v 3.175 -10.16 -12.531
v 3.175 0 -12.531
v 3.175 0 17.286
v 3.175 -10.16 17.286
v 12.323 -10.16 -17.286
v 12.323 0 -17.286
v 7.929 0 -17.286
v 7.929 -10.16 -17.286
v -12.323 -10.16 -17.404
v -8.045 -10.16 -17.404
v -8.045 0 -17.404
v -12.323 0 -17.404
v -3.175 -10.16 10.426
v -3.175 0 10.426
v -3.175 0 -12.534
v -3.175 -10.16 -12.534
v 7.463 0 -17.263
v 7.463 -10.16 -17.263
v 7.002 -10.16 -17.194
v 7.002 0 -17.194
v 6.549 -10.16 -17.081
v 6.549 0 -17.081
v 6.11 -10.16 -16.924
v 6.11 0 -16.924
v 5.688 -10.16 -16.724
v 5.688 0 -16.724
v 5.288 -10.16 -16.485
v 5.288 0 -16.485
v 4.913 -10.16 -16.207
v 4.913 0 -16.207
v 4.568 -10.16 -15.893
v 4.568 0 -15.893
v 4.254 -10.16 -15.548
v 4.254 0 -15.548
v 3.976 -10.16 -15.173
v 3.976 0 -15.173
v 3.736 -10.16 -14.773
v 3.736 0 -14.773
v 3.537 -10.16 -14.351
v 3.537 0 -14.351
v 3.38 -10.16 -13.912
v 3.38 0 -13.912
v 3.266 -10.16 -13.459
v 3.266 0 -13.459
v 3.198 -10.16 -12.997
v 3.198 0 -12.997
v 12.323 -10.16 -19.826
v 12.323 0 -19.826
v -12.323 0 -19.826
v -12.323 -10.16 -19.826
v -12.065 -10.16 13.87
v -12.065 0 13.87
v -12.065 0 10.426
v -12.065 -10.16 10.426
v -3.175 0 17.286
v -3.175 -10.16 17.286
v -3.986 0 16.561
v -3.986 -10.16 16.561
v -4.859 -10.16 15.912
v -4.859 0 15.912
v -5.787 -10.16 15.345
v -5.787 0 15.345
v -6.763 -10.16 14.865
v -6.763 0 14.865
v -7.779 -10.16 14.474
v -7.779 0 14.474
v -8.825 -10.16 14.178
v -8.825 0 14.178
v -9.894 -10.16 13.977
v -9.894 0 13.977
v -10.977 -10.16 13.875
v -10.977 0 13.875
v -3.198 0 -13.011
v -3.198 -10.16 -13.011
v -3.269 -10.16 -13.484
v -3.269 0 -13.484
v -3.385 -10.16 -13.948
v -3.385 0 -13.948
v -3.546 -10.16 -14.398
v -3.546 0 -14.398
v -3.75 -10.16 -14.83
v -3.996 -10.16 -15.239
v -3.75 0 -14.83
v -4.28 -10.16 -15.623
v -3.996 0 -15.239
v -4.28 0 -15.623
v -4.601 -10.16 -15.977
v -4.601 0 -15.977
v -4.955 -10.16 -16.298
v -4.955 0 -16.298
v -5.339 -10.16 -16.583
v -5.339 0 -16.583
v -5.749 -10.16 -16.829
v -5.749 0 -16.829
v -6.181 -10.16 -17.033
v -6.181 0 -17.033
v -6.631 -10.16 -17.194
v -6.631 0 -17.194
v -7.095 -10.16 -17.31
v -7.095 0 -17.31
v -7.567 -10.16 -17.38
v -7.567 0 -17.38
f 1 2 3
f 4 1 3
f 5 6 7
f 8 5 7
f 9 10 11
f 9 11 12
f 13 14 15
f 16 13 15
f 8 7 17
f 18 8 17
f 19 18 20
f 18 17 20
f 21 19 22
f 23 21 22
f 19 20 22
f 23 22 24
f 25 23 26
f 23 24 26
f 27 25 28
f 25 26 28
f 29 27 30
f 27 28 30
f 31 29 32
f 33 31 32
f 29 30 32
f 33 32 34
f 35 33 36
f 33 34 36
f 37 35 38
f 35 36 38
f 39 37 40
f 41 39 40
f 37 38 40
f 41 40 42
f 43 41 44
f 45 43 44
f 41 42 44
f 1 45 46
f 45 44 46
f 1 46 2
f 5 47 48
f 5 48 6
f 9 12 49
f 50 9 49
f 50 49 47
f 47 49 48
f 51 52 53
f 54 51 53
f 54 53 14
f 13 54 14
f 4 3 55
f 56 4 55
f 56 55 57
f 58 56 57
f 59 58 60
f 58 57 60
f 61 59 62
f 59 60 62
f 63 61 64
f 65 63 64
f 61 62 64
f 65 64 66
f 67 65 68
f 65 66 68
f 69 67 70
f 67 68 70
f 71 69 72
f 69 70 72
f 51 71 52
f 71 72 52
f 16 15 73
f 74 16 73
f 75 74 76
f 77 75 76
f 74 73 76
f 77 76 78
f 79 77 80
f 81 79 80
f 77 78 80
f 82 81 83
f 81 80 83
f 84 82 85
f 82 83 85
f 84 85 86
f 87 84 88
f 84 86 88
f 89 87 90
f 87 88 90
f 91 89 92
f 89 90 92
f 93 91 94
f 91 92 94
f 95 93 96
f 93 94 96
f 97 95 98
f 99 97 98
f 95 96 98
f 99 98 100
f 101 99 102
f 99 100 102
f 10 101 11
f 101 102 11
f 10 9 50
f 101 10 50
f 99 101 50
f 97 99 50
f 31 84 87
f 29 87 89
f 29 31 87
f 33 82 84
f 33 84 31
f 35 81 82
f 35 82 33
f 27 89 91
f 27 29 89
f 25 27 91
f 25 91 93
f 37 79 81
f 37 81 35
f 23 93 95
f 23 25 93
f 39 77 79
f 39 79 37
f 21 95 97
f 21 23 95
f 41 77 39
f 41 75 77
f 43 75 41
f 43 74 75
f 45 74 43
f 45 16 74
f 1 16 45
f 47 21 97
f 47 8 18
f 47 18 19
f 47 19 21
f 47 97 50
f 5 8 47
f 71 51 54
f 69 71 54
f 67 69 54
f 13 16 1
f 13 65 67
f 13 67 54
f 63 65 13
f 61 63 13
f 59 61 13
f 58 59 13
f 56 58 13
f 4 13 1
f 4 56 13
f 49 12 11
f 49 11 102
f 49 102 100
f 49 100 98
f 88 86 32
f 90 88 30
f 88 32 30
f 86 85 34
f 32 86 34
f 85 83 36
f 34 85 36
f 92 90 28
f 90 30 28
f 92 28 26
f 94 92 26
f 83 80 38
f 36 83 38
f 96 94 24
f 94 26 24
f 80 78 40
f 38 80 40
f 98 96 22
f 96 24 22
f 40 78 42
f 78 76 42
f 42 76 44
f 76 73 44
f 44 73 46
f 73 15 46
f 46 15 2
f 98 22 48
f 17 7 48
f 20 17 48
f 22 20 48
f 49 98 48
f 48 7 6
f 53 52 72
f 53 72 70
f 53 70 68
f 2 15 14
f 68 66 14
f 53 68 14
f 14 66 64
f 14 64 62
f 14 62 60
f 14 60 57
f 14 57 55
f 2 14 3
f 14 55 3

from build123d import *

# Parameters (mm, degrees)
F1_DEPTH = 10.16


with BuildPart() as f1:
    # F0 (on Front) → F1 (new body)
    with BuildSketch(Plane.XZ):
        with BuildLine():
            Line((3.175, -12.531403), (3.175, 17.285798))
            Line((3.175, 17.285798), (-3.175, 17.285798))
            ThreePointArc((-3.175, 17.285798), (-7.266525, 14.65801), (-12.065, 13.870302))
            Line((-12.065, 13.870302), (-12.065, 10.425861))
            Line((-12.065, 10.425861), (-3.175, 10.425861))
            Line((-3.175, 10.425861), (-3.175, -12.533976))
            ThreePointArc((-3.175, -12.533976), (-4.601328, -15.977436), (-8.044787, -17.403763))
            Line((-8.044787, -17.403763), (-12.323086, -17.403763))
            Line((-12.323086, -17.403763), (-12.323086, -19.825798))
            Line((-12.323086, -19.825798), (0, -19.825798))
            Line((0, -19.825798), (12.323086, -19.825798))
            Line((12.323086, -19.825798), (12.323086, -17.285798))
            Line((12.323086, -17.285798), (7.929395, -17.285798))
            ThreePointArc((7.929395, -17.285798), (4.56753, -15.893268), (3.175, -12.531403))
        make_face()
    extrude(amount=F1_DEPTH)


solid = f1.part
